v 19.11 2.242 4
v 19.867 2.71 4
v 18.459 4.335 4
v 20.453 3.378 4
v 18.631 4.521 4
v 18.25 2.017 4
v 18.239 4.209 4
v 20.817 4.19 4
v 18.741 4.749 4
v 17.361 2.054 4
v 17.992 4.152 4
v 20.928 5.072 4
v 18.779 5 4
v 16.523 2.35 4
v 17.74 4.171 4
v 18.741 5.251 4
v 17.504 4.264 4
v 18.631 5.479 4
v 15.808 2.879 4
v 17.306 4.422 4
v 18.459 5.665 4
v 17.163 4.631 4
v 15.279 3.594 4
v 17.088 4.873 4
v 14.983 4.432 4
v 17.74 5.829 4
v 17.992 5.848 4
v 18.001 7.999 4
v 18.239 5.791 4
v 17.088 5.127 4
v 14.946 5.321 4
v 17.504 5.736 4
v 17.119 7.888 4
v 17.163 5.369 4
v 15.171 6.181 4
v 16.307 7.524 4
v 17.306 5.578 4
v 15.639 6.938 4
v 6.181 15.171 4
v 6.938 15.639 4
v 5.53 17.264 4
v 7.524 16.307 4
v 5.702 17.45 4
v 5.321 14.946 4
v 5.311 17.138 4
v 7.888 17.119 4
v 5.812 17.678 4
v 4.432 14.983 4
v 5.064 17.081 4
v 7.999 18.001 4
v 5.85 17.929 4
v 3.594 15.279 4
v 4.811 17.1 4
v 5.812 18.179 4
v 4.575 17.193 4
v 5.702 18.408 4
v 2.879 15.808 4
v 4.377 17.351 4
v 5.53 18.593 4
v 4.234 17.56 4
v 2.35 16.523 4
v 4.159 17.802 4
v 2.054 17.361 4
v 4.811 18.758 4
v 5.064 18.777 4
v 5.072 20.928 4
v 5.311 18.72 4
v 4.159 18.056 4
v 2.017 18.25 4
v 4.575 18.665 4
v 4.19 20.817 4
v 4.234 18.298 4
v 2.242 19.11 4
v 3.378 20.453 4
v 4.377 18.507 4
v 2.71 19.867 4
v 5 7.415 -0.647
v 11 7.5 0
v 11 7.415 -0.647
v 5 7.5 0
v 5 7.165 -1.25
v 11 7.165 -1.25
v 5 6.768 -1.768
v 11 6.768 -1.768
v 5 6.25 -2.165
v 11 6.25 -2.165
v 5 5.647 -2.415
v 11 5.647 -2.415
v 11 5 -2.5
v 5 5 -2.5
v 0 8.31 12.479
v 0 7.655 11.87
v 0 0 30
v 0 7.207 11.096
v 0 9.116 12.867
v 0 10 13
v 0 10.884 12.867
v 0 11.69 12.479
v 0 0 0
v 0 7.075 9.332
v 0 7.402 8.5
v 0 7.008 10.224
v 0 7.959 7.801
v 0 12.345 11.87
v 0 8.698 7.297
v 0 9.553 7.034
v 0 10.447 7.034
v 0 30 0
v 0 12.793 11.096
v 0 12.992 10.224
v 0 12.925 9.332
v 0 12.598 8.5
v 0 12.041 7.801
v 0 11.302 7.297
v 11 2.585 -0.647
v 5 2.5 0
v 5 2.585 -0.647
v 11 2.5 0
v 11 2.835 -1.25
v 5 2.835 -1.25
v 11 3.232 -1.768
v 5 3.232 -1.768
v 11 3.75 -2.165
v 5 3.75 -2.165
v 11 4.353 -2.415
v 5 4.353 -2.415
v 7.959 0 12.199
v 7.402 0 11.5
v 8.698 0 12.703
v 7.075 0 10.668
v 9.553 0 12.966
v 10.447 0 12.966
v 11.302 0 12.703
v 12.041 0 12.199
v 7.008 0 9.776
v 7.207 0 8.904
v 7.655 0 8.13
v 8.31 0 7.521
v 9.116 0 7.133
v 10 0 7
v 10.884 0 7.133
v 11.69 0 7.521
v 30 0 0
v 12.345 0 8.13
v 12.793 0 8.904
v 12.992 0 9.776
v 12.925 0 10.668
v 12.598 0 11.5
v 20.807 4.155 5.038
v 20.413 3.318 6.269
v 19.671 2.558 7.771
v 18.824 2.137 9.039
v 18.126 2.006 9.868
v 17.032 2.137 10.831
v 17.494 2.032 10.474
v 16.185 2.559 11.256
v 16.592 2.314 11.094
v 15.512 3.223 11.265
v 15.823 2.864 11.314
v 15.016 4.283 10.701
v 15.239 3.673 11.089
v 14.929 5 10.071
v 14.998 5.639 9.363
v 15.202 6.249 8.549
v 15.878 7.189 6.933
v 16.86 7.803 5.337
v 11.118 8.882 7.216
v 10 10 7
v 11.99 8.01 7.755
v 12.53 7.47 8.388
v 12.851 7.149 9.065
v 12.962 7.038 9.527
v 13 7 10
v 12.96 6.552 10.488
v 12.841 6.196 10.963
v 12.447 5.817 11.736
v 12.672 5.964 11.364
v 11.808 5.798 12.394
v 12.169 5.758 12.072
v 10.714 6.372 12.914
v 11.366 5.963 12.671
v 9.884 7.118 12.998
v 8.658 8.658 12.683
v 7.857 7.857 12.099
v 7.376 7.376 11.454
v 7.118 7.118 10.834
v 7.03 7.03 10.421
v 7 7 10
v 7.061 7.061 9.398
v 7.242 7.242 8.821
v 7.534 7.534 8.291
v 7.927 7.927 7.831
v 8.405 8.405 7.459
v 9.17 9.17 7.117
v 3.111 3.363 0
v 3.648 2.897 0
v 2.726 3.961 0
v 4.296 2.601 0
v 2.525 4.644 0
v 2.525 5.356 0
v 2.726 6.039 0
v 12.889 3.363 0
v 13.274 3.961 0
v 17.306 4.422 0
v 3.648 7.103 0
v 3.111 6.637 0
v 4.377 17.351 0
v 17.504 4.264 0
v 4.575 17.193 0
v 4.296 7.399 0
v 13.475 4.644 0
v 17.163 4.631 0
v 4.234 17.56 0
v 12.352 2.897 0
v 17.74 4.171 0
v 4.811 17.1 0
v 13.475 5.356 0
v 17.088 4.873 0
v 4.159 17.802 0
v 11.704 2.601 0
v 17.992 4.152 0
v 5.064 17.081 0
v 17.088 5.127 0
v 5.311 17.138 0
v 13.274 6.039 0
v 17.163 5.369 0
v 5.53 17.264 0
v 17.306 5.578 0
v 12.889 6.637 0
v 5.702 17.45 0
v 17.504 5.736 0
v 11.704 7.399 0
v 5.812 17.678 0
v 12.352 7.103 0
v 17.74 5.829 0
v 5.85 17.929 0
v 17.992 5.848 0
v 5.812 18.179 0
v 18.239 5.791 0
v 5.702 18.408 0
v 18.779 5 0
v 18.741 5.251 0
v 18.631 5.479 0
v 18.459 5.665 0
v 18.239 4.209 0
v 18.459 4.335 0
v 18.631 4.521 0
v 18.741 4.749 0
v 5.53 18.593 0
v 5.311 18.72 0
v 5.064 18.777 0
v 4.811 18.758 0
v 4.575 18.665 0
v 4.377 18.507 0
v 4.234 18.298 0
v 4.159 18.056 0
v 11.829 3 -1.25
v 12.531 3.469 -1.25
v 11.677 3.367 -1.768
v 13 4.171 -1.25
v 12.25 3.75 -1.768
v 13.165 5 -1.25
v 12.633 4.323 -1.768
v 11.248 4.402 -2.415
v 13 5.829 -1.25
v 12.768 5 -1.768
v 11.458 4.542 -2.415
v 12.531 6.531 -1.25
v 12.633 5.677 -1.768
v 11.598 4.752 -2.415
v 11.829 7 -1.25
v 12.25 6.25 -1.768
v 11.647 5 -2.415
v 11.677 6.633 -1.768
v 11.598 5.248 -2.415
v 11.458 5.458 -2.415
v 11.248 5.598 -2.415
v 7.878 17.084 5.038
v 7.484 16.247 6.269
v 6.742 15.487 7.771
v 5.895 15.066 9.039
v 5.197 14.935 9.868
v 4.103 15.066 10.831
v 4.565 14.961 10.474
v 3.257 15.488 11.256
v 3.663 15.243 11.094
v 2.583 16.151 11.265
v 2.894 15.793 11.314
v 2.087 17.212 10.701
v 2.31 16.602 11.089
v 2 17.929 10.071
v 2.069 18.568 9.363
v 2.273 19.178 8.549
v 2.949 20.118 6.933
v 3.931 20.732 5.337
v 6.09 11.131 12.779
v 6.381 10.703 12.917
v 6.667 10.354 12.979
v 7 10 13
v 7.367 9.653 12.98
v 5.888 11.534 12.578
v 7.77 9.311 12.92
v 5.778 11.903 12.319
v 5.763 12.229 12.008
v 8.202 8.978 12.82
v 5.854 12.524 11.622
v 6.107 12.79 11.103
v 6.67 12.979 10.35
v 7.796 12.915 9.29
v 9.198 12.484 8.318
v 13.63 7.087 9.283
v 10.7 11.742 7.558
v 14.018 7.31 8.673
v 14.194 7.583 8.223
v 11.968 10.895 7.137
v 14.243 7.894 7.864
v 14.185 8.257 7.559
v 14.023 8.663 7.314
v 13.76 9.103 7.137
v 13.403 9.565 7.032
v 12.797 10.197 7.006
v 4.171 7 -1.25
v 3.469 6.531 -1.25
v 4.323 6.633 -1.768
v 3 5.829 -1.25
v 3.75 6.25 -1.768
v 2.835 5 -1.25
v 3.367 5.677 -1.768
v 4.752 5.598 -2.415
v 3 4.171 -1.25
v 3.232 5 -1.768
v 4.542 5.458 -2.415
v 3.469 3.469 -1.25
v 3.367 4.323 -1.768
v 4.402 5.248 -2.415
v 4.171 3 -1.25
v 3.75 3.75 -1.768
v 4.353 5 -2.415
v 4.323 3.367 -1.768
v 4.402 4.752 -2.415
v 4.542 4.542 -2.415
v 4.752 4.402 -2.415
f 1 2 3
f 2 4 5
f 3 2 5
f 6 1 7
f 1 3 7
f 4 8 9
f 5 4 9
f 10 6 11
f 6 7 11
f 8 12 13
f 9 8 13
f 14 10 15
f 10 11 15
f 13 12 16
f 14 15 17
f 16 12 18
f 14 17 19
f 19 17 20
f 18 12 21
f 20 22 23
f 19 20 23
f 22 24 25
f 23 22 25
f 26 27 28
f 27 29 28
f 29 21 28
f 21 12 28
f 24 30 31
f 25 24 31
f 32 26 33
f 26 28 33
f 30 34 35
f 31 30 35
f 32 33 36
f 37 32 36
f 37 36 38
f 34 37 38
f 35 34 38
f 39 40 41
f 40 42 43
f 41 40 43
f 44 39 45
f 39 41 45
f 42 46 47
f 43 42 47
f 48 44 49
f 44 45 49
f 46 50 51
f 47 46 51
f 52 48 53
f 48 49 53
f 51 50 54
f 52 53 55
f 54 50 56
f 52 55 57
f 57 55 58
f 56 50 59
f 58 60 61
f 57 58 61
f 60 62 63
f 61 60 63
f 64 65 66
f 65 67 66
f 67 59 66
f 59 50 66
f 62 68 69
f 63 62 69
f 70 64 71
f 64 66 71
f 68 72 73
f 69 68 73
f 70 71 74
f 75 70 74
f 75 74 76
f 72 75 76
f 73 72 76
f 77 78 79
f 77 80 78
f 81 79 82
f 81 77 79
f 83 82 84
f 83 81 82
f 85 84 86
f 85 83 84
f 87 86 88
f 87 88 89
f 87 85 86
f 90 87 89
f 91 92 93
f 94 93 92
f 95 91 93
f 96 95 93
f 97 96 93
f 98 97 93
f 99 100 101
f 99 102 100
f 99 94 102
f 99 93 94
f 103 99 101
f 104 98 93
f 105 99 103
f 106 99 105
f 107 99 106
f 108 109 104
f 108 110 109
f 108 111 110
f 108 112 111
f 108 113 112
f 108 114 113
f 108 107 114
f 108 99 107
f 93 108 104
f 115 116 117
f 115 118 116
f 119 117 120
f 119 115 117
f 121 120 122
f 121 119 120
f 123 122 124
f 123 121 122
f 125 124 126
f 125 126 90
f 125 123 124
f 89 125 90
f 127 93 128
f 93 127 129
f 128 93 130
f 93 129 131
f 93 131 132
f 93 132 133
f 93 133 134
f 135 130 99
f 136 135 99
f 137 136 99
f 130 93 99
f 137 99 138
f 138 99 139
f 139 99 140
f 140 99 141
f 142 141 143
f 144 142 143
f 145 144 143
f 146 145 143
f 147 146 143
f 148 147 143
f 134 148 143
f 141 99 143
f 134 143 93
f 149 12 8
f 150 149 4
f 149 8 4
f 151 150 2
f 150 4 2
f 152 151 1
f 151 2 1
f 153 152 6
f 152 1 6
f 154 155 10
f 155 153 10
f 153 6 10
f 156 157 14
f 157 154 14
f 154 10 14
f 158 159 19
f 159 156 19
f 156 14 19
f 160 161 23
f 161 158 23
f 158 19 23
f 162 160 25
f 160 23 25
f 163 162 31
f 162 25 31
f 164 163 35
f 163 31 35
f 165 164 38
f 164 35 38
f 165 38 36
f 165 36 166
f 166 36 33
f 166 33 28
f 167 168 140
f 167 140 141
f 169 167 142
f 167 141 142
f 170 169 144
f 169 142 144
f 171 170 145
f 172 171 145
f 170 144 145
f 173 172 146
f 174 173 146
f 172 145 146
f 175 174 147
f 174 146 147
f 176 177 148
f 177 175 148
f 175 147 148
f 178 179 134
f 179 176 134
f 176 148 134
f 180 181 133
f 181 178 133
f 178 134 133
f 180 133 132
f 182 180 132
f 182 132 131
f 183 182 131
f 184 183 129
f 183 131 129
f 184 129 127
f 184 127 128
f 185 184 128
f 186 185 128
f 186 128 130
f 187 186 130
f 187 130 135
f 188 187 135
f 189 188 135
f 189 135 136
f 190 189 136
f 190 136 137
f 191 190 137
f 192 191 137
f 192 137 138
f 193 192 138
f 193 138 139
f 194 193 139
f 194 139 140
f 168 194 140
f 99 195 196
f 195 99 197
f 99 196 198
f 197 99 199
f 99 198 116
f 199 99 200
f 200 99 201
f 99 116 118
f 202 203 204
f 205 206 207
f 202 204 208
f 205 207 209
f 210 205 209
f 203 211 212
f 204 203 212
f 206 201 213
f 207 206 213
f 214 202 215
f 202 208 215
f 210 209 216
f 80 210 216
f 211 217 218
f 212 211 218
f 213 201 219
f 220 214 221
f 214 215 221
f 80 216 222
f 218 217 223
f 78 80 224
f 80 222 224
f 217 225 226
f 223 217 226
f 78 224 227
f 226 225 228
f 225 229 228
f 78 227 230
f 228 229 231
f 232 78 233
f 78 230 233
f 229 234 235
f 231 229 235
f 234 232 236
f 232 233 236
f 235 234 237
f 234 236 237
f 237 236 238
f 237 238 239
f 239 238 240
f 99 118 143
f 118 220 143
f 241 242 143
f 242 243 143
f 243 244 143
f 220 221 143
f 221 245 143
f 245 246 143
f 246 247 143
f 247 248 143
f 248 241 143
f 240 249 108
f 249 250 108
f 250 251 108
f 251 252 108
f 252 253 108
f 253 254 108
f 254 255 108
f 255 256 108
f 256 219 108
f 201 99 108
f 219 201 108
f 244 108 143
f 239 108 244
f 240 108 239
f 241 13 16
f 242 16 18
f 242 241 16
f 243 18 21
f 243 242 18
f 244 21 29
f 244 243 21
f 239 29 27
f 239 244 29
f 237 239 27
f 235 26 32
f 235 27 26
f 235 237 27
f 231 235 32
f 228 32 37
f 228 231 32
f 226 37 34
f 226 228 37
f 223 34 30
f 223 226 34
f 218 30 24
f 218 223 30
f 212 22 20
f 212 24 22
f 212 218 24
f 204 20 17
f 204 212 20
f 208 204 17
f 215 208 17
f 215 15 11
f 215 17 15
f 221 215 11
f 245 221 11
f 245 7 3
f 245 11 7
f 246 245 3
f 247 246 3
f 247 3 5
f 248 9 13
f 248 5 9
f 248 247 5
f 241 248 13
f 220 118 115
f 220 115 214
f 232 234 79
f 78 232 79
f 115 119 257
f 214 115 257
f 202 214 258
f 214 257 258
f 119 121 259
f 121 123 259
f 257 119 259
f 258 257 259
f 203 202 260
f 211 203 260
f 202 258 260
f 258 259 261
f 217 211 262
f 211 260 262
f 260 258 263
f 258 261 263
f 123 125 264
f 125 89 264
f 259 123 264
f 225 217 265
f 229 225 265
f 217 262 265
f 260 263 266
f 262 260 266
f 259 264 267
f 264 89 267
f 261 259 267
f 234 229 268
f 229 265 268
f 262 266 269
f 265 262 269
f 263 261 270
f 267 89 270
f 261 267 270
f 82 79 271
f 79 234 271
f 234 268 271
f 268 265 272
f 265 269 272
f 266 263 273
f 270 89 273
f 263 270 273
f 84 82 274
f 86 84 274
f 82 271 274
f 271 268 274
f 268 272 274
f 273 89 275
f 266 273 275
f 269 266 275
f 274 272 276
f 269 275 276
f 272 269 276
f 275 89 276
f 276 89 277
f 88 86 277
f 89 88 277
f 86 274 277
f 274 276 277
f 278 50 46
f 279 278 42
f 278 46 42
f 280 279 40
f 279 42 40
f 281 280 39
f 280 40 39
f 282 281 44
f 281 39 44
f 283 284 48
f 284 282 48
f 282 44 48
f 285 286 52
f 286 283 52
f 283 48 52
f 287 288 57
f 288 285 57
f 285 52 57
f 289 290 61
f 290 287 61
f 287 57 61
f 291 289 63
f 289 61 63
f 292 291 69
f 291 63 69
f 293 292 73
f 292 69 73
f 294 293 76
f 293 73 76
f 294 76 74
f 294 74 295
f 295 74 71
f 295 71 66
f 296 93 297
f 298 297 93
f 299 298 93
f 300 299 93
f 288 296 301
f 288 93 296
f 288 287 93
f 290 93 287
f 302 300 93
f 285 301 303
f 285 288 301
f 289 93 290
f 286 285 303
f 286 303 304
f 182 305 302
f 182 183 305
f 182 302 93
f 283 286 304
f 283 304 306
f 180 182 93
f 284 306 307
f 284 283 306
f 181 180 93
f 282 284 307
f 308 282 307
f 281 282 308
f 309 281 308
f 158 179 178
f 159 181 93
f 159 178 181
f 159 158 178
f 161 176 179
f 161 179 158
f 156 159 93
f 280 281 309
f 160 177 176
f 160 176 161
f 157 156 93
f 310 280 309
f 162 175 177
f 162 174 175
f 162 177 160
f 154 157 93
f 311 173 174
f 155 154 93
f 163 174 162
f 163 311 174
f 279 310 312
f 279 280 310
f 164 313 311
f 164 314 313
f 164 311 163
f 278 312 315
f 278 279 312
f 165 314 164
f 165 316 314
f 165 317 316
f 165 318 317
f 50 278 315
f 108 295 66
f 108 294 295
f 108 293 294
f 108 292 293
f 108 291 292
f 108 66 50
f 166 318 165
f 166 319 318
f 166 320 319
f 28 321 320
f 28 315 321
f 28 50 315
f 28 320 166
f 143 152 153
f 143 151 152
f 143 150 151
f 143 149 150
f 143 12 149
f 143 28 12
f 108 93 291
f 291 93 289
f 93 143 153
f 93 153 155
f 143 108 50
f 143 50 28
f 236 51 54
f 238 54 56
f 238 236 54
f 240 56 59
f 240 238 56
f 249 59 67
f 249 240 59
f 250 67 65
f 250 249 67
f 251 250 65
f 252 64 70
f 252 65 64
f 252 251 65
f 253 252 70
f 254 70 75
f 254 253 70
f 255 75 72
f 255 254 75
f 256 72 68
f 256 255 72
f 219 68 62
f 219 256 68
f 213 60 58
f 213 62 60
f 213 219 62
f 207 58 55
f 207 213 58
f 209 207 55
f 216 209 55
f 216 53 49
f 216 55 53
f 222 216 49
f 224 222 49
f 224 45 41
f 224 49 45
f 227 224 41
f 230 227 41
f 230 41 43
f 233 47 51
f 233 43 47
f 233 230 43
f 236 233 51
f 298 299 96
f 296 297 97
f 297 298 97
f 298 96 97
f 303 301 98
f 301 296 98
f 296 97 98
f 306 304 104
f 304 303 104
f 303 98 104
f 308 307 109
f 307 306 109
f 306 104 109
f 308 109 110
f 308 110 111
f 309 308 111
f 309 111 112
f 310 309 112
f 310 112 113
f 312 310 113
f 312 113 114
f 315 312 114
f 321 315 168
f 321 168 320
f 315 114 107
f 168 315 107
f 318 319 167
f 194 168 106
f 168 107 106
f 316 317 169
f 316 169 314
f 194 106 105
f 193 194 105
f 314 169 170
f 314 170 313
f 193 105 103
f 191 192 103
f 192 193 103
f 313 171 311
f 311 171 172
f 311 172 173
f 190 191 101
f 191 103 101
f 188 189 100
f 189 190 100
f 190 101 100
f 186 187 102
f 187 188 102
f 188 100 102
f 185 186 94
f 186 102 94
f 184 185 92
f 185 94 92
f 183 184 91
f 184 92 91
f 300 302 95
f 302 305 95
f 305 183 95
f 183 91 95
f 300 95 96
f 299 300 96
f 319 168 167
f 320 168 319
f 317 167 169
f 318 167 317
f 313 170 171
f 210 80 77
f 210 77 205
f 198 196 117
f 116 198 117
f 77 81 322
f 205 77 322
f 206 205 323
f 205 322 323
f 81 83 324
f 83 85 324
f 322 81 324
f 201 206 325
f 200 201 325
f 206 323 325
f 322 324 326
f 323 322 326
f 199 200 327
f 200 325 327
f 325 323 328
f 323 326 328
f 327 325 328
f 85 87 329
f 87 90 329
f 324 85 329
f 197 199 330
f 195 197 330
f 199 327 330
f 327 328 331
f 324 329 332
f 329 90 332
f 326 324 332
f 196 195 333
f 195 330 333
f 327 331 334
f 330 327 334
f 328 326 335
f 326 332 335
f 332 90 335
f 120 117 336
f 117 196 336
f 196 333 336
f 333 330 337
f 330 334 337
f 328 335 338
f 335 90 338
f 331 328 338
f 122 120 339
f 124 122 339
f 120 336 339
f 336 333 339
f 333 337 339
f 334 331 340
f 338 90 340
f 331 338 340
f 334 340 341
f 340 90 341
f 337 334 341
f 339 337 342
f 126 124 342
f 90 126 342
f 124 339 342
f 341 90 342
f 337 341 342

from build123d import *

# Parameters (mm, degrees)
CROQUIS1_W              = 30
CROQUIS1_H              = 30
CROQUIS1_R              = 0.85
SALIENTE_EXTRUIR1_DEPTH = 30
CHAFL_N1_START          = 17.320508076
CHAFL_N1_OUTLINE_W      = 52
CHAFL_N1_OUTLINE_H      = 46
CHAFL_N1_DEPTH          = 35.679491924
CORTAR_EXTRUIR1_REACH   = 51.759
CROQUIS2_R              = 3
CORTAR_EXTRUIR2_REACH   = 53.962
CROQUIS3_R              = 3
SALIENTE_EXTRUIR2_DEPTH = 2.5
REDONDEO1_R             = 2.5
CORTAR_EXTRUIR3_REACH   = 53.962
CROQUIS5_R              = 3


with BuildPart() as part:
    # Croquis1 → Saliente-Extruir1 (new body)
    with BuildSketch(Plane.XY):
        with Locations((15, 15)):
            Rectangle(CROQUIS1_W, CROQUIS1_H)
        with Locations((5, 17.928932188)):
            Circle(CROQUIS1_R, mode=Mode.SUBTRACT)
        with Locations((17.928932188, 5)):
            Circle(CROQUIS1_R, mode=Mode.SUBTRACT)
    extrude(amount=SALIENTE_EXTRUIR1_DEPTH)

    # Chaflán1: read off the stored shape, not the designer's step
    # Chaflán1 outline → Chaflán1 (cut)
    with BuildSketch(Plane(origin=(0, 0, 0), x_dir=(0.8164965809277258, -0.4082482904638636, -0.40824829046386285), z_dir=(0.5773502691896261, 0.5773502691896261, 0.5773502691896251)).offset(CHAFL_N1_START)):
        Rectangle(CHAFL_N1_OUTLINE_W, CHAFL_N1_OUTLINE_H)
    extrude(amount=CHAFL_N1_DEPTH, mode=Mode.SUBTRACT)

    # Croquis2 → Cortar-Extruir1 (cut, up to next)
    with BuildSketch(Plane(origin=(0, 0, 4), x_dir=(-1, 0, 0), z_dir=(0, 0, -1)), mode=Mode.PRIVATE) as cortar_extruir1_sk1:
        with Locations((-5, 17.928932188)):
            Circle(CROQUIS2_R)
    cortar_extruir1_tool1 = extrude(cortar_extruir1_sk1.sketch, amount=-CORTAR_EXTRUIR1_REACH, mode=Mode.PRIVATE) & part.part
    # Croquis2 → Cortar-Extruir1 (cut, up to next)
    with BuildSketch(Plane(origin=(0, 0, 4), x_dir=(-1, 0, 0), z_dir=(0, 0, -1)), mode=Mode.PRIVATE) as cortar_extruir1_sk2:
        with Locations((-17.928932188, 5)):
            Circle(CROQUIS2_R)
    cortar_extruir1_tool2 = extrude(cortar_extruir1_sk2.sketch, amount=-CORTAR_EXTRUIR1_REACH, mode=Mode.PRIVATE) & part.part
    add(cortar_extruir1_tool1.solids().sort_by_distance((5, 17.928932, 4))[0], mode=Mode.SUBTRACT)
    add(cortar_extruir1_tool2.solids().sort_by_distance((17.928932, 5, 4))[0], mode=Mode.SUBTRACT)

    # Cortar-Extruir2: up to this plane
    cortar_extruir2_end = Plane(origin=(0, 0, 30), z_dir=(0.5773502691896264, 0.5773502691896264, 0.5773502691896246))
    # Croquis3 → Cortar-Extruir2 (cut, up to the surface)
    with BuildSketch(Plane.ZY, mode=Mode.PRIVATE) as cortar_extruir2_sk1:
        with Locations((10, 10)):
            Circle(CROQUIS3_R)
    cortar_extruir2_tool1 = split(extrude(cortar_extruir2_sk1.sketch, amount=-CORTAR_EXTRUIR2_REACH, mode=Mode.PRIVATE), bisect_by=cortar_extruir2_end, keep=Keep.BOTH, mode=Mode.PRIVATE)
    add(cortar_extruir2_tool1.solids().sort_by_distance((0, 10, 10))[0], mode=Mode.SUBTRACT)

    # Croquis4 → Saliente-Extruir2 (add)
    with BuildSketch(Plane(origin=(0, 0, 0), x_dir=(-1, 0, 0), z_dir=(0, 0, -1))):
        with BuildLine():
            Line((-11, 7.5), (-5, 7.5))
            ThreePointArc((-5, 7.5), (-2.5, 5), (-5, 2.5))
            Line((-5, 2.5), (-11, 2.5))
            ThreePointArc((-11, 2.5), (-13.5, 5), (-11, 7.5))
        make_face()
    extrude(amount=SALIENTE_EXTRUIR2_DEPTH)

    # Redondeo1
    redondeo1_edges = [part.edges().sort_by_distance(p)[0] for p in [
        (8, 7.5, -2.5),
        (2.5, 5, -2.5),
        (8, 2.5, -2.5),
        (13.5, 5, -2.5),
    ]]
    fillet(redondeo1_edges, radius=REDONDEO1_R - 0.0001)  # a hair under: the kernel refuses the full size

    # Croquis5 → Cortar-Extruir3 (cut, up to next)
    with BuildSketch(Plane.XZ, mode=Mode.PRIVATE) as cortar_extruir3_sk1:
        with Locations(Location((10, 10, 0), (0, 0, 270))):
            Circle(CROQUIS5_R)
    cortar_extruir3_tool1 = extrude(cortar_extruir3_sk1.sketch, amount=-CORTAR_EXTRUIR3_REACH, mode=Mode.PRIVATE) & part.part
    add(cortar_extruir3_tool1.solids().sort_by_distance((10, 0, 10))[0], mode=Mode.SUBTRACT)


solid = part.part
